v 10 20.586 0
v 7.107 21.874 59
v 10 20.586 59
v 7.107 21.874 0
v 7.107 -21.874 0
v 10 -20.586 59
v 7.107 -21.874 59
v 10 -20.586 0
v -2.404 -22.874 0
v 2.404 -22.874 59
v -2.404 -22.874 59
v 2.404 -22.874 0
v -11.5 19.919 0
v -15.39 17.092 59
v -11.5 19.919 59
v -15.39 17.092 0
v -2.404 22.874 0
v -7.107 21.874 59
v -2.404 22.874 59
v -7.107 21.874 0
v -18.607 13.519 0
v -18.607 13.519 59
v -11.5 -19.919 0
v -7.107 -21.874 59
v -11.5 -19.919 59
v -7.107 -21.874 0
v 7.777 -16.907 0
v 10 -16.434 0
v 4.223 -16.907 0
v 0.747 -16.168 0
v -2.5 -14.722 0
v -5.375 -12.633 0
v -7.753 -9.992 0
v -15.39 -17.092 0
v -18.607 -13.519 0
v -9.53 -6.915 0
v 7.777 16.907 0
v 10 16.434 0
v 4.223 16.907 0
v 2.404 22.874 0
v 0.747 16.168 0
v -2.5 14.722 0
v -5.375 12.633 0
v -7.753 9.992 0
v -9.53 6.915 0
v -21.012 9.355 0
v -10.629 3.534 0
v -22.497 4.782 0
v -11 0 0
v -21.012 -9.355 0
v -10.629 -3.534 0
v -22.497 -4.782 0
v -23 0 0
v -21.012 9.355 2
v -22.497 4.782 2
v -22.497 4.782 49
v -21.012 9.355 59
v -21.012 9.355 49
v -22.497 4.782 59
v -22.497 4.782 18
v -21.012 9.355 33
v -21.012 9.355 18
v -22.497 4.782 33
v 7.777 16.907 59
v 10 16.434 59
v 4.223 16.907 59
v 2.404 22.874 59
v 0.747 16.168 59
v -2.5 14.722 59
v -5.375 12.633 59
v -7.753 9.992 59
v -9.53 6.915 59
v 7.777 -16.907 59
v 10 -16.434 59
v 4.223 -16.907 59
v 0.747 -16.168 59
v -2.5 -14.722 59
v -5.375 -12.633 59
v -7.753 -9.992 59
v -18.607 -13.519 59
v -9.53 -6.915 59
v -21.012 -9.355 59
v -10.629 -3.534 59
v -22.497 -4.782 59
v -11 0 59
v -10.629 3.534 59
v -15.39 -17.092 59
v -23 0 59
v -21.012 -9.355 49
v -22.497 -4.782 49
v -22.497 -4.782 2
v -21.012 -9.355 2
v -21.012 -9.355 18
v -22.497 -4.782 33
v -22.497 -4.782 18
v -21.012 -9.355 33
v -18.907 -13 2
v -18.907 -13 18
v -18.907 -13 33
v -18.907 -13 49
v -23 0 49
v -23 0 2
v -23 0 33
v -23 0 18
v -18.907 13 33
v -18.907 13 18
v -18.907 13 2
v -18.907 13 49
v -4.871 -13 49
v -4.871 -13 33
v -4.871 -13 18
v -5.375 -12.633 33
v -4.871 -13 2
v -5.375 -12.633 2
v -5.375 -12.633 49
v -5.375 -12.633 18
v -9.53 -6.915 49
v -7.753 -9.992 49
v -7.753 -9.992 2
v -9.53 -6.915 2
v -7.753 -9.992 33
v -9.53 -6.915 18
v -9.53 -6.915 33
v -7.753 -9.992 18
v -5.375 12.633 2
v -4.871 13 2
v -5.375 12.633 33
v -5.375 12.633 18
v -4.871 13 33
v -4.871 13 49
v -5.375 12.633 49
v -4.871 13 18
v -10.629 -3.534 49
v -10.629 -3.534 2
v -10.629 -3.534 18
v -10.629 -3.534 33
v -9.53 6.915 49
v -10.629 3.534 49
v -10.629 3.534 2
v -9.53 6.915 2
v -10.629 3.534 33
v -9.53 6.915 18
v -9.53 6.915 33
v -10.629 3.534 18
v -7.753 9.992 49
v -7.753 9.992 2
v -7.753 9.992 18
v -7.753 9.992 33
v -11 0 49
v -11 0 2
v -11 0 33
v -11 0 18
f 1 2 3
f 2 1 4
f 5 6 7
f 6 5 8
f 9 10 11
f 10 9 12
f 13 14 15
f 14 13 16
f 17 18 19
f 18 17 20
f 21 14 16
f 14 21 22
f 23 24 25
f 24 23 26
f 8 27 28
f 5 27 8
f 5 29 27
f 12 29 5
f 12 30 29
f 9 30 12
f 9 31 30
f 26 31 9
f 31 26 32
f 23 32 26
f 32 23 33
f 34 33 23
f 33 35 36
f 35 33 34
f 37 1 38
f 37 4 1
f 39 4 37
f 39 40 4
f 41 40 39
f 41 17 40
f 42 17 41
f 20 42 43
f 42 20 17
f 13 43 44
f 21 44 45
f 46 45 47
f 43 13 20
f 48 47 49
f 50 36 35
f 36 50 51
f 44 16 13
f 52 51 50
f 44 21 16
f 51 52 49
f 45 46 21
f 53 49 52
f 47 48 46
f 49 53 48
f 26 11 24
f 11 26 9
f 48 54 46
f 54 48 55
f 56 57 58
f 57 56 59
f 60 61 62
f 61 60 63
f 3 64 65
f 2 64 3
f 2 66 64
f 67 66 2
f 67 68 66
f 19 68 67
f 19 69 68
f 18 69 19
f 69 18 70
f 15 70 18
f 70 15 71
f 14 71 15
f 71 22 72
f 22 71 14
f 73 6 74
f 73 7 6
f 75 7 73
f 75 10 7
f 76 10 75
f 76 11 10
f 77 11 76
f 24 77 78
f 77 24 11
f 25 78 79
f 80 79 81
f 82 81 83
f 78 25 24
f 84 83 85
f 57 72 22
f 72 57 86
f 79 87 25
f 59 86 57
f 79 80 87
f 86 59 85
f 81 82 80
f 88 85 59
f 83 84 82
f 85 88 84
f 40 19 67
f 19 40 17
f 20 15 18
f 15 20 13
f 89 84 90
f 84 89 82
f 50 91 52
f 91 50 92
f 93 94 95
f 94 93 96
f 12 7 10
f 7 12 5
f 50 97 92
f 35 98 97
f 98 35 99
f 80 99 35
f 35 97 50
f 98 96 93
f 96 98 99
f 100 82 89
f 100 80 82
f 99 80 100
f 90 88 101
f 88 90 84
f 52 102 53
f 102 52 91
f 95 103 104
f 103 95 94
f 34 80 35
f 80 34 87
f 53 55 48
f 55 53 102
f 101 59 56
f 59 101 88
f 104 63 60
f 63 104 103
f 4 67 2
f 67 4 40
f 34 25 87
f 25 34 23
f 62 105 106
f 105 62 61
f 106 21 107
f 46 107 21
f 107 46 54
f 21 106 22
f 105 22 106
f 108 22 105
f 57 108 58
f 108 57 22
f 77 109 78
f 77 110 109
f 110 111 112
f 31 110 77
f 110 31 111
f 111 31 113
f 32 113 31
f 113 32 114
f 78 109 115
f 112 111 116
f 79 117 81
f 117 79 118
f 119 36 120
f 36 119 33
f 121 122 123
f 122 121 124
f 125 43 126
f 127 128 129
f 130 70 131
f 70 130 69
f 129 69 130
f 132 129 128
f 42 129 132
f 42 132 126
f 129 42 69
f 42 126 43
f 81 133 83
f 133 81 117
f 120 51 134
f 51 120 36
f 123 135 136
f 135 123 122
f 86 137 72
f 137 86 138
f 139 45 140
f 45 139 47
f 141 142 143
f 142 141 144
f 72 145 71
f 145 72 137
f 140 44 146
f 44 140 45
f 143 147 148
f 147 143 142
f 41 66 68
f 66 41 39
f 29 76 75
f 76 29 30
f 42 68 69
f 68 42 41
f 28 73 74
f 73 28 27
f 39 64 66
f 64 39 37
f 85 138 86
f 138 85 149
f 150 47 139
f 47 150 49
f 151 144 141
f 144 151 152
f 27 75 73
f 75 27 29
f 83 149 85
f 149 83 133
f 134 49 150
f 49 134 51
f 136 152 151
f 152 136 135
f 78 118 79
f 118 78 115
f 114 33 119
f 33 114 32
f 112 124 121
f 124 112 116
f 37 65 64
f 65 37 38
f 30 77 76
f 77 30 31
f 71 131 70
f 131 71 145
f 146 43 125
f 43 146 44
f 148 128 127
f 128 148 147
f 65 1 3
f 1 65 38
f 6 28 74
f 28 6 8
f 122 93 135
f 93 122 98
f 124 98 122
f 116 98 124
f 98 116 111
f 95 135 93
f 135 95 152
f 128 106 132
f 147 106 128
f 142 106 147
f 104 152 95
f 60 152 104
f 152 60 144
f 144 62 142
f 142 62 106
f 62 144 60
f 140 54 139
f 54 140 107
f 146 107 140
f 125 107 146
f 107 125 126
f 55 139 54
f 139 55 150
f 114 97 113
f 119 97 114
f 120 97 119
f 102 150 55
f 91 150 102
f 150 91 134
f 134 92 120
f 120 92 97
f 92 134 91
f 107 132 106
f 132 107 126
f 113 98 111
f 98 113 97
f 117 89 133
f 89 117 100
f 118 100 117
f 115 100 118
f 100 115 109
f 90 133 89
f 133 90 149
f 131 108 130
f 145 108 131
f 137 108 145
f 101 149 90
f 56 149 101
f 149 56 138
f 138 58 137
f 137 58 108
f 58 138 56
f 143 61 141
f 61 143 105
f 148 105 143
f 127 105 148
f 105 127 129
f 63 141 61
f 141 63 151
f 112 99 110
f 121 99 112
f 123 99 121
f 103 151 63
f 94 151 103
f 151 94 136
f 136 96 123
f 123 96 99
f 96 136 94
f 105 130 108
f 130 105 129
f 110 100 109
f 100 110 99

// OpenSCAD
z0 = 2;   // thickness on top
z1 = 16;  // thickness of bolt
z2 = 15;  // thickness of gap
z3 = 10;  // thickness beneath

zz = z0 + z1 + z2 + z1 + z3;

y0 = 26;  // length of bolt cutout

d0 = 34;  // diameter of stem

x0 = 12;  // clearance for bolt
x1 = 10;  // trim offset


difference() {
    cylinder(d=d0+x0,h=zz);
    translate([x0/2,0,-1]) cylinder(d=d0,h=zz+2);
    translate([x1,-d0,-1]) cube([d0*2,d0*2,zz+2]);
    #translate([-y0,-y0/2,z3-z1/2]) cube([y0,y0,z1]);
    #translate([-y0,-y0/2,z3+z1+z2-z1/2]) cube([y0,y0,z1]);
}    
